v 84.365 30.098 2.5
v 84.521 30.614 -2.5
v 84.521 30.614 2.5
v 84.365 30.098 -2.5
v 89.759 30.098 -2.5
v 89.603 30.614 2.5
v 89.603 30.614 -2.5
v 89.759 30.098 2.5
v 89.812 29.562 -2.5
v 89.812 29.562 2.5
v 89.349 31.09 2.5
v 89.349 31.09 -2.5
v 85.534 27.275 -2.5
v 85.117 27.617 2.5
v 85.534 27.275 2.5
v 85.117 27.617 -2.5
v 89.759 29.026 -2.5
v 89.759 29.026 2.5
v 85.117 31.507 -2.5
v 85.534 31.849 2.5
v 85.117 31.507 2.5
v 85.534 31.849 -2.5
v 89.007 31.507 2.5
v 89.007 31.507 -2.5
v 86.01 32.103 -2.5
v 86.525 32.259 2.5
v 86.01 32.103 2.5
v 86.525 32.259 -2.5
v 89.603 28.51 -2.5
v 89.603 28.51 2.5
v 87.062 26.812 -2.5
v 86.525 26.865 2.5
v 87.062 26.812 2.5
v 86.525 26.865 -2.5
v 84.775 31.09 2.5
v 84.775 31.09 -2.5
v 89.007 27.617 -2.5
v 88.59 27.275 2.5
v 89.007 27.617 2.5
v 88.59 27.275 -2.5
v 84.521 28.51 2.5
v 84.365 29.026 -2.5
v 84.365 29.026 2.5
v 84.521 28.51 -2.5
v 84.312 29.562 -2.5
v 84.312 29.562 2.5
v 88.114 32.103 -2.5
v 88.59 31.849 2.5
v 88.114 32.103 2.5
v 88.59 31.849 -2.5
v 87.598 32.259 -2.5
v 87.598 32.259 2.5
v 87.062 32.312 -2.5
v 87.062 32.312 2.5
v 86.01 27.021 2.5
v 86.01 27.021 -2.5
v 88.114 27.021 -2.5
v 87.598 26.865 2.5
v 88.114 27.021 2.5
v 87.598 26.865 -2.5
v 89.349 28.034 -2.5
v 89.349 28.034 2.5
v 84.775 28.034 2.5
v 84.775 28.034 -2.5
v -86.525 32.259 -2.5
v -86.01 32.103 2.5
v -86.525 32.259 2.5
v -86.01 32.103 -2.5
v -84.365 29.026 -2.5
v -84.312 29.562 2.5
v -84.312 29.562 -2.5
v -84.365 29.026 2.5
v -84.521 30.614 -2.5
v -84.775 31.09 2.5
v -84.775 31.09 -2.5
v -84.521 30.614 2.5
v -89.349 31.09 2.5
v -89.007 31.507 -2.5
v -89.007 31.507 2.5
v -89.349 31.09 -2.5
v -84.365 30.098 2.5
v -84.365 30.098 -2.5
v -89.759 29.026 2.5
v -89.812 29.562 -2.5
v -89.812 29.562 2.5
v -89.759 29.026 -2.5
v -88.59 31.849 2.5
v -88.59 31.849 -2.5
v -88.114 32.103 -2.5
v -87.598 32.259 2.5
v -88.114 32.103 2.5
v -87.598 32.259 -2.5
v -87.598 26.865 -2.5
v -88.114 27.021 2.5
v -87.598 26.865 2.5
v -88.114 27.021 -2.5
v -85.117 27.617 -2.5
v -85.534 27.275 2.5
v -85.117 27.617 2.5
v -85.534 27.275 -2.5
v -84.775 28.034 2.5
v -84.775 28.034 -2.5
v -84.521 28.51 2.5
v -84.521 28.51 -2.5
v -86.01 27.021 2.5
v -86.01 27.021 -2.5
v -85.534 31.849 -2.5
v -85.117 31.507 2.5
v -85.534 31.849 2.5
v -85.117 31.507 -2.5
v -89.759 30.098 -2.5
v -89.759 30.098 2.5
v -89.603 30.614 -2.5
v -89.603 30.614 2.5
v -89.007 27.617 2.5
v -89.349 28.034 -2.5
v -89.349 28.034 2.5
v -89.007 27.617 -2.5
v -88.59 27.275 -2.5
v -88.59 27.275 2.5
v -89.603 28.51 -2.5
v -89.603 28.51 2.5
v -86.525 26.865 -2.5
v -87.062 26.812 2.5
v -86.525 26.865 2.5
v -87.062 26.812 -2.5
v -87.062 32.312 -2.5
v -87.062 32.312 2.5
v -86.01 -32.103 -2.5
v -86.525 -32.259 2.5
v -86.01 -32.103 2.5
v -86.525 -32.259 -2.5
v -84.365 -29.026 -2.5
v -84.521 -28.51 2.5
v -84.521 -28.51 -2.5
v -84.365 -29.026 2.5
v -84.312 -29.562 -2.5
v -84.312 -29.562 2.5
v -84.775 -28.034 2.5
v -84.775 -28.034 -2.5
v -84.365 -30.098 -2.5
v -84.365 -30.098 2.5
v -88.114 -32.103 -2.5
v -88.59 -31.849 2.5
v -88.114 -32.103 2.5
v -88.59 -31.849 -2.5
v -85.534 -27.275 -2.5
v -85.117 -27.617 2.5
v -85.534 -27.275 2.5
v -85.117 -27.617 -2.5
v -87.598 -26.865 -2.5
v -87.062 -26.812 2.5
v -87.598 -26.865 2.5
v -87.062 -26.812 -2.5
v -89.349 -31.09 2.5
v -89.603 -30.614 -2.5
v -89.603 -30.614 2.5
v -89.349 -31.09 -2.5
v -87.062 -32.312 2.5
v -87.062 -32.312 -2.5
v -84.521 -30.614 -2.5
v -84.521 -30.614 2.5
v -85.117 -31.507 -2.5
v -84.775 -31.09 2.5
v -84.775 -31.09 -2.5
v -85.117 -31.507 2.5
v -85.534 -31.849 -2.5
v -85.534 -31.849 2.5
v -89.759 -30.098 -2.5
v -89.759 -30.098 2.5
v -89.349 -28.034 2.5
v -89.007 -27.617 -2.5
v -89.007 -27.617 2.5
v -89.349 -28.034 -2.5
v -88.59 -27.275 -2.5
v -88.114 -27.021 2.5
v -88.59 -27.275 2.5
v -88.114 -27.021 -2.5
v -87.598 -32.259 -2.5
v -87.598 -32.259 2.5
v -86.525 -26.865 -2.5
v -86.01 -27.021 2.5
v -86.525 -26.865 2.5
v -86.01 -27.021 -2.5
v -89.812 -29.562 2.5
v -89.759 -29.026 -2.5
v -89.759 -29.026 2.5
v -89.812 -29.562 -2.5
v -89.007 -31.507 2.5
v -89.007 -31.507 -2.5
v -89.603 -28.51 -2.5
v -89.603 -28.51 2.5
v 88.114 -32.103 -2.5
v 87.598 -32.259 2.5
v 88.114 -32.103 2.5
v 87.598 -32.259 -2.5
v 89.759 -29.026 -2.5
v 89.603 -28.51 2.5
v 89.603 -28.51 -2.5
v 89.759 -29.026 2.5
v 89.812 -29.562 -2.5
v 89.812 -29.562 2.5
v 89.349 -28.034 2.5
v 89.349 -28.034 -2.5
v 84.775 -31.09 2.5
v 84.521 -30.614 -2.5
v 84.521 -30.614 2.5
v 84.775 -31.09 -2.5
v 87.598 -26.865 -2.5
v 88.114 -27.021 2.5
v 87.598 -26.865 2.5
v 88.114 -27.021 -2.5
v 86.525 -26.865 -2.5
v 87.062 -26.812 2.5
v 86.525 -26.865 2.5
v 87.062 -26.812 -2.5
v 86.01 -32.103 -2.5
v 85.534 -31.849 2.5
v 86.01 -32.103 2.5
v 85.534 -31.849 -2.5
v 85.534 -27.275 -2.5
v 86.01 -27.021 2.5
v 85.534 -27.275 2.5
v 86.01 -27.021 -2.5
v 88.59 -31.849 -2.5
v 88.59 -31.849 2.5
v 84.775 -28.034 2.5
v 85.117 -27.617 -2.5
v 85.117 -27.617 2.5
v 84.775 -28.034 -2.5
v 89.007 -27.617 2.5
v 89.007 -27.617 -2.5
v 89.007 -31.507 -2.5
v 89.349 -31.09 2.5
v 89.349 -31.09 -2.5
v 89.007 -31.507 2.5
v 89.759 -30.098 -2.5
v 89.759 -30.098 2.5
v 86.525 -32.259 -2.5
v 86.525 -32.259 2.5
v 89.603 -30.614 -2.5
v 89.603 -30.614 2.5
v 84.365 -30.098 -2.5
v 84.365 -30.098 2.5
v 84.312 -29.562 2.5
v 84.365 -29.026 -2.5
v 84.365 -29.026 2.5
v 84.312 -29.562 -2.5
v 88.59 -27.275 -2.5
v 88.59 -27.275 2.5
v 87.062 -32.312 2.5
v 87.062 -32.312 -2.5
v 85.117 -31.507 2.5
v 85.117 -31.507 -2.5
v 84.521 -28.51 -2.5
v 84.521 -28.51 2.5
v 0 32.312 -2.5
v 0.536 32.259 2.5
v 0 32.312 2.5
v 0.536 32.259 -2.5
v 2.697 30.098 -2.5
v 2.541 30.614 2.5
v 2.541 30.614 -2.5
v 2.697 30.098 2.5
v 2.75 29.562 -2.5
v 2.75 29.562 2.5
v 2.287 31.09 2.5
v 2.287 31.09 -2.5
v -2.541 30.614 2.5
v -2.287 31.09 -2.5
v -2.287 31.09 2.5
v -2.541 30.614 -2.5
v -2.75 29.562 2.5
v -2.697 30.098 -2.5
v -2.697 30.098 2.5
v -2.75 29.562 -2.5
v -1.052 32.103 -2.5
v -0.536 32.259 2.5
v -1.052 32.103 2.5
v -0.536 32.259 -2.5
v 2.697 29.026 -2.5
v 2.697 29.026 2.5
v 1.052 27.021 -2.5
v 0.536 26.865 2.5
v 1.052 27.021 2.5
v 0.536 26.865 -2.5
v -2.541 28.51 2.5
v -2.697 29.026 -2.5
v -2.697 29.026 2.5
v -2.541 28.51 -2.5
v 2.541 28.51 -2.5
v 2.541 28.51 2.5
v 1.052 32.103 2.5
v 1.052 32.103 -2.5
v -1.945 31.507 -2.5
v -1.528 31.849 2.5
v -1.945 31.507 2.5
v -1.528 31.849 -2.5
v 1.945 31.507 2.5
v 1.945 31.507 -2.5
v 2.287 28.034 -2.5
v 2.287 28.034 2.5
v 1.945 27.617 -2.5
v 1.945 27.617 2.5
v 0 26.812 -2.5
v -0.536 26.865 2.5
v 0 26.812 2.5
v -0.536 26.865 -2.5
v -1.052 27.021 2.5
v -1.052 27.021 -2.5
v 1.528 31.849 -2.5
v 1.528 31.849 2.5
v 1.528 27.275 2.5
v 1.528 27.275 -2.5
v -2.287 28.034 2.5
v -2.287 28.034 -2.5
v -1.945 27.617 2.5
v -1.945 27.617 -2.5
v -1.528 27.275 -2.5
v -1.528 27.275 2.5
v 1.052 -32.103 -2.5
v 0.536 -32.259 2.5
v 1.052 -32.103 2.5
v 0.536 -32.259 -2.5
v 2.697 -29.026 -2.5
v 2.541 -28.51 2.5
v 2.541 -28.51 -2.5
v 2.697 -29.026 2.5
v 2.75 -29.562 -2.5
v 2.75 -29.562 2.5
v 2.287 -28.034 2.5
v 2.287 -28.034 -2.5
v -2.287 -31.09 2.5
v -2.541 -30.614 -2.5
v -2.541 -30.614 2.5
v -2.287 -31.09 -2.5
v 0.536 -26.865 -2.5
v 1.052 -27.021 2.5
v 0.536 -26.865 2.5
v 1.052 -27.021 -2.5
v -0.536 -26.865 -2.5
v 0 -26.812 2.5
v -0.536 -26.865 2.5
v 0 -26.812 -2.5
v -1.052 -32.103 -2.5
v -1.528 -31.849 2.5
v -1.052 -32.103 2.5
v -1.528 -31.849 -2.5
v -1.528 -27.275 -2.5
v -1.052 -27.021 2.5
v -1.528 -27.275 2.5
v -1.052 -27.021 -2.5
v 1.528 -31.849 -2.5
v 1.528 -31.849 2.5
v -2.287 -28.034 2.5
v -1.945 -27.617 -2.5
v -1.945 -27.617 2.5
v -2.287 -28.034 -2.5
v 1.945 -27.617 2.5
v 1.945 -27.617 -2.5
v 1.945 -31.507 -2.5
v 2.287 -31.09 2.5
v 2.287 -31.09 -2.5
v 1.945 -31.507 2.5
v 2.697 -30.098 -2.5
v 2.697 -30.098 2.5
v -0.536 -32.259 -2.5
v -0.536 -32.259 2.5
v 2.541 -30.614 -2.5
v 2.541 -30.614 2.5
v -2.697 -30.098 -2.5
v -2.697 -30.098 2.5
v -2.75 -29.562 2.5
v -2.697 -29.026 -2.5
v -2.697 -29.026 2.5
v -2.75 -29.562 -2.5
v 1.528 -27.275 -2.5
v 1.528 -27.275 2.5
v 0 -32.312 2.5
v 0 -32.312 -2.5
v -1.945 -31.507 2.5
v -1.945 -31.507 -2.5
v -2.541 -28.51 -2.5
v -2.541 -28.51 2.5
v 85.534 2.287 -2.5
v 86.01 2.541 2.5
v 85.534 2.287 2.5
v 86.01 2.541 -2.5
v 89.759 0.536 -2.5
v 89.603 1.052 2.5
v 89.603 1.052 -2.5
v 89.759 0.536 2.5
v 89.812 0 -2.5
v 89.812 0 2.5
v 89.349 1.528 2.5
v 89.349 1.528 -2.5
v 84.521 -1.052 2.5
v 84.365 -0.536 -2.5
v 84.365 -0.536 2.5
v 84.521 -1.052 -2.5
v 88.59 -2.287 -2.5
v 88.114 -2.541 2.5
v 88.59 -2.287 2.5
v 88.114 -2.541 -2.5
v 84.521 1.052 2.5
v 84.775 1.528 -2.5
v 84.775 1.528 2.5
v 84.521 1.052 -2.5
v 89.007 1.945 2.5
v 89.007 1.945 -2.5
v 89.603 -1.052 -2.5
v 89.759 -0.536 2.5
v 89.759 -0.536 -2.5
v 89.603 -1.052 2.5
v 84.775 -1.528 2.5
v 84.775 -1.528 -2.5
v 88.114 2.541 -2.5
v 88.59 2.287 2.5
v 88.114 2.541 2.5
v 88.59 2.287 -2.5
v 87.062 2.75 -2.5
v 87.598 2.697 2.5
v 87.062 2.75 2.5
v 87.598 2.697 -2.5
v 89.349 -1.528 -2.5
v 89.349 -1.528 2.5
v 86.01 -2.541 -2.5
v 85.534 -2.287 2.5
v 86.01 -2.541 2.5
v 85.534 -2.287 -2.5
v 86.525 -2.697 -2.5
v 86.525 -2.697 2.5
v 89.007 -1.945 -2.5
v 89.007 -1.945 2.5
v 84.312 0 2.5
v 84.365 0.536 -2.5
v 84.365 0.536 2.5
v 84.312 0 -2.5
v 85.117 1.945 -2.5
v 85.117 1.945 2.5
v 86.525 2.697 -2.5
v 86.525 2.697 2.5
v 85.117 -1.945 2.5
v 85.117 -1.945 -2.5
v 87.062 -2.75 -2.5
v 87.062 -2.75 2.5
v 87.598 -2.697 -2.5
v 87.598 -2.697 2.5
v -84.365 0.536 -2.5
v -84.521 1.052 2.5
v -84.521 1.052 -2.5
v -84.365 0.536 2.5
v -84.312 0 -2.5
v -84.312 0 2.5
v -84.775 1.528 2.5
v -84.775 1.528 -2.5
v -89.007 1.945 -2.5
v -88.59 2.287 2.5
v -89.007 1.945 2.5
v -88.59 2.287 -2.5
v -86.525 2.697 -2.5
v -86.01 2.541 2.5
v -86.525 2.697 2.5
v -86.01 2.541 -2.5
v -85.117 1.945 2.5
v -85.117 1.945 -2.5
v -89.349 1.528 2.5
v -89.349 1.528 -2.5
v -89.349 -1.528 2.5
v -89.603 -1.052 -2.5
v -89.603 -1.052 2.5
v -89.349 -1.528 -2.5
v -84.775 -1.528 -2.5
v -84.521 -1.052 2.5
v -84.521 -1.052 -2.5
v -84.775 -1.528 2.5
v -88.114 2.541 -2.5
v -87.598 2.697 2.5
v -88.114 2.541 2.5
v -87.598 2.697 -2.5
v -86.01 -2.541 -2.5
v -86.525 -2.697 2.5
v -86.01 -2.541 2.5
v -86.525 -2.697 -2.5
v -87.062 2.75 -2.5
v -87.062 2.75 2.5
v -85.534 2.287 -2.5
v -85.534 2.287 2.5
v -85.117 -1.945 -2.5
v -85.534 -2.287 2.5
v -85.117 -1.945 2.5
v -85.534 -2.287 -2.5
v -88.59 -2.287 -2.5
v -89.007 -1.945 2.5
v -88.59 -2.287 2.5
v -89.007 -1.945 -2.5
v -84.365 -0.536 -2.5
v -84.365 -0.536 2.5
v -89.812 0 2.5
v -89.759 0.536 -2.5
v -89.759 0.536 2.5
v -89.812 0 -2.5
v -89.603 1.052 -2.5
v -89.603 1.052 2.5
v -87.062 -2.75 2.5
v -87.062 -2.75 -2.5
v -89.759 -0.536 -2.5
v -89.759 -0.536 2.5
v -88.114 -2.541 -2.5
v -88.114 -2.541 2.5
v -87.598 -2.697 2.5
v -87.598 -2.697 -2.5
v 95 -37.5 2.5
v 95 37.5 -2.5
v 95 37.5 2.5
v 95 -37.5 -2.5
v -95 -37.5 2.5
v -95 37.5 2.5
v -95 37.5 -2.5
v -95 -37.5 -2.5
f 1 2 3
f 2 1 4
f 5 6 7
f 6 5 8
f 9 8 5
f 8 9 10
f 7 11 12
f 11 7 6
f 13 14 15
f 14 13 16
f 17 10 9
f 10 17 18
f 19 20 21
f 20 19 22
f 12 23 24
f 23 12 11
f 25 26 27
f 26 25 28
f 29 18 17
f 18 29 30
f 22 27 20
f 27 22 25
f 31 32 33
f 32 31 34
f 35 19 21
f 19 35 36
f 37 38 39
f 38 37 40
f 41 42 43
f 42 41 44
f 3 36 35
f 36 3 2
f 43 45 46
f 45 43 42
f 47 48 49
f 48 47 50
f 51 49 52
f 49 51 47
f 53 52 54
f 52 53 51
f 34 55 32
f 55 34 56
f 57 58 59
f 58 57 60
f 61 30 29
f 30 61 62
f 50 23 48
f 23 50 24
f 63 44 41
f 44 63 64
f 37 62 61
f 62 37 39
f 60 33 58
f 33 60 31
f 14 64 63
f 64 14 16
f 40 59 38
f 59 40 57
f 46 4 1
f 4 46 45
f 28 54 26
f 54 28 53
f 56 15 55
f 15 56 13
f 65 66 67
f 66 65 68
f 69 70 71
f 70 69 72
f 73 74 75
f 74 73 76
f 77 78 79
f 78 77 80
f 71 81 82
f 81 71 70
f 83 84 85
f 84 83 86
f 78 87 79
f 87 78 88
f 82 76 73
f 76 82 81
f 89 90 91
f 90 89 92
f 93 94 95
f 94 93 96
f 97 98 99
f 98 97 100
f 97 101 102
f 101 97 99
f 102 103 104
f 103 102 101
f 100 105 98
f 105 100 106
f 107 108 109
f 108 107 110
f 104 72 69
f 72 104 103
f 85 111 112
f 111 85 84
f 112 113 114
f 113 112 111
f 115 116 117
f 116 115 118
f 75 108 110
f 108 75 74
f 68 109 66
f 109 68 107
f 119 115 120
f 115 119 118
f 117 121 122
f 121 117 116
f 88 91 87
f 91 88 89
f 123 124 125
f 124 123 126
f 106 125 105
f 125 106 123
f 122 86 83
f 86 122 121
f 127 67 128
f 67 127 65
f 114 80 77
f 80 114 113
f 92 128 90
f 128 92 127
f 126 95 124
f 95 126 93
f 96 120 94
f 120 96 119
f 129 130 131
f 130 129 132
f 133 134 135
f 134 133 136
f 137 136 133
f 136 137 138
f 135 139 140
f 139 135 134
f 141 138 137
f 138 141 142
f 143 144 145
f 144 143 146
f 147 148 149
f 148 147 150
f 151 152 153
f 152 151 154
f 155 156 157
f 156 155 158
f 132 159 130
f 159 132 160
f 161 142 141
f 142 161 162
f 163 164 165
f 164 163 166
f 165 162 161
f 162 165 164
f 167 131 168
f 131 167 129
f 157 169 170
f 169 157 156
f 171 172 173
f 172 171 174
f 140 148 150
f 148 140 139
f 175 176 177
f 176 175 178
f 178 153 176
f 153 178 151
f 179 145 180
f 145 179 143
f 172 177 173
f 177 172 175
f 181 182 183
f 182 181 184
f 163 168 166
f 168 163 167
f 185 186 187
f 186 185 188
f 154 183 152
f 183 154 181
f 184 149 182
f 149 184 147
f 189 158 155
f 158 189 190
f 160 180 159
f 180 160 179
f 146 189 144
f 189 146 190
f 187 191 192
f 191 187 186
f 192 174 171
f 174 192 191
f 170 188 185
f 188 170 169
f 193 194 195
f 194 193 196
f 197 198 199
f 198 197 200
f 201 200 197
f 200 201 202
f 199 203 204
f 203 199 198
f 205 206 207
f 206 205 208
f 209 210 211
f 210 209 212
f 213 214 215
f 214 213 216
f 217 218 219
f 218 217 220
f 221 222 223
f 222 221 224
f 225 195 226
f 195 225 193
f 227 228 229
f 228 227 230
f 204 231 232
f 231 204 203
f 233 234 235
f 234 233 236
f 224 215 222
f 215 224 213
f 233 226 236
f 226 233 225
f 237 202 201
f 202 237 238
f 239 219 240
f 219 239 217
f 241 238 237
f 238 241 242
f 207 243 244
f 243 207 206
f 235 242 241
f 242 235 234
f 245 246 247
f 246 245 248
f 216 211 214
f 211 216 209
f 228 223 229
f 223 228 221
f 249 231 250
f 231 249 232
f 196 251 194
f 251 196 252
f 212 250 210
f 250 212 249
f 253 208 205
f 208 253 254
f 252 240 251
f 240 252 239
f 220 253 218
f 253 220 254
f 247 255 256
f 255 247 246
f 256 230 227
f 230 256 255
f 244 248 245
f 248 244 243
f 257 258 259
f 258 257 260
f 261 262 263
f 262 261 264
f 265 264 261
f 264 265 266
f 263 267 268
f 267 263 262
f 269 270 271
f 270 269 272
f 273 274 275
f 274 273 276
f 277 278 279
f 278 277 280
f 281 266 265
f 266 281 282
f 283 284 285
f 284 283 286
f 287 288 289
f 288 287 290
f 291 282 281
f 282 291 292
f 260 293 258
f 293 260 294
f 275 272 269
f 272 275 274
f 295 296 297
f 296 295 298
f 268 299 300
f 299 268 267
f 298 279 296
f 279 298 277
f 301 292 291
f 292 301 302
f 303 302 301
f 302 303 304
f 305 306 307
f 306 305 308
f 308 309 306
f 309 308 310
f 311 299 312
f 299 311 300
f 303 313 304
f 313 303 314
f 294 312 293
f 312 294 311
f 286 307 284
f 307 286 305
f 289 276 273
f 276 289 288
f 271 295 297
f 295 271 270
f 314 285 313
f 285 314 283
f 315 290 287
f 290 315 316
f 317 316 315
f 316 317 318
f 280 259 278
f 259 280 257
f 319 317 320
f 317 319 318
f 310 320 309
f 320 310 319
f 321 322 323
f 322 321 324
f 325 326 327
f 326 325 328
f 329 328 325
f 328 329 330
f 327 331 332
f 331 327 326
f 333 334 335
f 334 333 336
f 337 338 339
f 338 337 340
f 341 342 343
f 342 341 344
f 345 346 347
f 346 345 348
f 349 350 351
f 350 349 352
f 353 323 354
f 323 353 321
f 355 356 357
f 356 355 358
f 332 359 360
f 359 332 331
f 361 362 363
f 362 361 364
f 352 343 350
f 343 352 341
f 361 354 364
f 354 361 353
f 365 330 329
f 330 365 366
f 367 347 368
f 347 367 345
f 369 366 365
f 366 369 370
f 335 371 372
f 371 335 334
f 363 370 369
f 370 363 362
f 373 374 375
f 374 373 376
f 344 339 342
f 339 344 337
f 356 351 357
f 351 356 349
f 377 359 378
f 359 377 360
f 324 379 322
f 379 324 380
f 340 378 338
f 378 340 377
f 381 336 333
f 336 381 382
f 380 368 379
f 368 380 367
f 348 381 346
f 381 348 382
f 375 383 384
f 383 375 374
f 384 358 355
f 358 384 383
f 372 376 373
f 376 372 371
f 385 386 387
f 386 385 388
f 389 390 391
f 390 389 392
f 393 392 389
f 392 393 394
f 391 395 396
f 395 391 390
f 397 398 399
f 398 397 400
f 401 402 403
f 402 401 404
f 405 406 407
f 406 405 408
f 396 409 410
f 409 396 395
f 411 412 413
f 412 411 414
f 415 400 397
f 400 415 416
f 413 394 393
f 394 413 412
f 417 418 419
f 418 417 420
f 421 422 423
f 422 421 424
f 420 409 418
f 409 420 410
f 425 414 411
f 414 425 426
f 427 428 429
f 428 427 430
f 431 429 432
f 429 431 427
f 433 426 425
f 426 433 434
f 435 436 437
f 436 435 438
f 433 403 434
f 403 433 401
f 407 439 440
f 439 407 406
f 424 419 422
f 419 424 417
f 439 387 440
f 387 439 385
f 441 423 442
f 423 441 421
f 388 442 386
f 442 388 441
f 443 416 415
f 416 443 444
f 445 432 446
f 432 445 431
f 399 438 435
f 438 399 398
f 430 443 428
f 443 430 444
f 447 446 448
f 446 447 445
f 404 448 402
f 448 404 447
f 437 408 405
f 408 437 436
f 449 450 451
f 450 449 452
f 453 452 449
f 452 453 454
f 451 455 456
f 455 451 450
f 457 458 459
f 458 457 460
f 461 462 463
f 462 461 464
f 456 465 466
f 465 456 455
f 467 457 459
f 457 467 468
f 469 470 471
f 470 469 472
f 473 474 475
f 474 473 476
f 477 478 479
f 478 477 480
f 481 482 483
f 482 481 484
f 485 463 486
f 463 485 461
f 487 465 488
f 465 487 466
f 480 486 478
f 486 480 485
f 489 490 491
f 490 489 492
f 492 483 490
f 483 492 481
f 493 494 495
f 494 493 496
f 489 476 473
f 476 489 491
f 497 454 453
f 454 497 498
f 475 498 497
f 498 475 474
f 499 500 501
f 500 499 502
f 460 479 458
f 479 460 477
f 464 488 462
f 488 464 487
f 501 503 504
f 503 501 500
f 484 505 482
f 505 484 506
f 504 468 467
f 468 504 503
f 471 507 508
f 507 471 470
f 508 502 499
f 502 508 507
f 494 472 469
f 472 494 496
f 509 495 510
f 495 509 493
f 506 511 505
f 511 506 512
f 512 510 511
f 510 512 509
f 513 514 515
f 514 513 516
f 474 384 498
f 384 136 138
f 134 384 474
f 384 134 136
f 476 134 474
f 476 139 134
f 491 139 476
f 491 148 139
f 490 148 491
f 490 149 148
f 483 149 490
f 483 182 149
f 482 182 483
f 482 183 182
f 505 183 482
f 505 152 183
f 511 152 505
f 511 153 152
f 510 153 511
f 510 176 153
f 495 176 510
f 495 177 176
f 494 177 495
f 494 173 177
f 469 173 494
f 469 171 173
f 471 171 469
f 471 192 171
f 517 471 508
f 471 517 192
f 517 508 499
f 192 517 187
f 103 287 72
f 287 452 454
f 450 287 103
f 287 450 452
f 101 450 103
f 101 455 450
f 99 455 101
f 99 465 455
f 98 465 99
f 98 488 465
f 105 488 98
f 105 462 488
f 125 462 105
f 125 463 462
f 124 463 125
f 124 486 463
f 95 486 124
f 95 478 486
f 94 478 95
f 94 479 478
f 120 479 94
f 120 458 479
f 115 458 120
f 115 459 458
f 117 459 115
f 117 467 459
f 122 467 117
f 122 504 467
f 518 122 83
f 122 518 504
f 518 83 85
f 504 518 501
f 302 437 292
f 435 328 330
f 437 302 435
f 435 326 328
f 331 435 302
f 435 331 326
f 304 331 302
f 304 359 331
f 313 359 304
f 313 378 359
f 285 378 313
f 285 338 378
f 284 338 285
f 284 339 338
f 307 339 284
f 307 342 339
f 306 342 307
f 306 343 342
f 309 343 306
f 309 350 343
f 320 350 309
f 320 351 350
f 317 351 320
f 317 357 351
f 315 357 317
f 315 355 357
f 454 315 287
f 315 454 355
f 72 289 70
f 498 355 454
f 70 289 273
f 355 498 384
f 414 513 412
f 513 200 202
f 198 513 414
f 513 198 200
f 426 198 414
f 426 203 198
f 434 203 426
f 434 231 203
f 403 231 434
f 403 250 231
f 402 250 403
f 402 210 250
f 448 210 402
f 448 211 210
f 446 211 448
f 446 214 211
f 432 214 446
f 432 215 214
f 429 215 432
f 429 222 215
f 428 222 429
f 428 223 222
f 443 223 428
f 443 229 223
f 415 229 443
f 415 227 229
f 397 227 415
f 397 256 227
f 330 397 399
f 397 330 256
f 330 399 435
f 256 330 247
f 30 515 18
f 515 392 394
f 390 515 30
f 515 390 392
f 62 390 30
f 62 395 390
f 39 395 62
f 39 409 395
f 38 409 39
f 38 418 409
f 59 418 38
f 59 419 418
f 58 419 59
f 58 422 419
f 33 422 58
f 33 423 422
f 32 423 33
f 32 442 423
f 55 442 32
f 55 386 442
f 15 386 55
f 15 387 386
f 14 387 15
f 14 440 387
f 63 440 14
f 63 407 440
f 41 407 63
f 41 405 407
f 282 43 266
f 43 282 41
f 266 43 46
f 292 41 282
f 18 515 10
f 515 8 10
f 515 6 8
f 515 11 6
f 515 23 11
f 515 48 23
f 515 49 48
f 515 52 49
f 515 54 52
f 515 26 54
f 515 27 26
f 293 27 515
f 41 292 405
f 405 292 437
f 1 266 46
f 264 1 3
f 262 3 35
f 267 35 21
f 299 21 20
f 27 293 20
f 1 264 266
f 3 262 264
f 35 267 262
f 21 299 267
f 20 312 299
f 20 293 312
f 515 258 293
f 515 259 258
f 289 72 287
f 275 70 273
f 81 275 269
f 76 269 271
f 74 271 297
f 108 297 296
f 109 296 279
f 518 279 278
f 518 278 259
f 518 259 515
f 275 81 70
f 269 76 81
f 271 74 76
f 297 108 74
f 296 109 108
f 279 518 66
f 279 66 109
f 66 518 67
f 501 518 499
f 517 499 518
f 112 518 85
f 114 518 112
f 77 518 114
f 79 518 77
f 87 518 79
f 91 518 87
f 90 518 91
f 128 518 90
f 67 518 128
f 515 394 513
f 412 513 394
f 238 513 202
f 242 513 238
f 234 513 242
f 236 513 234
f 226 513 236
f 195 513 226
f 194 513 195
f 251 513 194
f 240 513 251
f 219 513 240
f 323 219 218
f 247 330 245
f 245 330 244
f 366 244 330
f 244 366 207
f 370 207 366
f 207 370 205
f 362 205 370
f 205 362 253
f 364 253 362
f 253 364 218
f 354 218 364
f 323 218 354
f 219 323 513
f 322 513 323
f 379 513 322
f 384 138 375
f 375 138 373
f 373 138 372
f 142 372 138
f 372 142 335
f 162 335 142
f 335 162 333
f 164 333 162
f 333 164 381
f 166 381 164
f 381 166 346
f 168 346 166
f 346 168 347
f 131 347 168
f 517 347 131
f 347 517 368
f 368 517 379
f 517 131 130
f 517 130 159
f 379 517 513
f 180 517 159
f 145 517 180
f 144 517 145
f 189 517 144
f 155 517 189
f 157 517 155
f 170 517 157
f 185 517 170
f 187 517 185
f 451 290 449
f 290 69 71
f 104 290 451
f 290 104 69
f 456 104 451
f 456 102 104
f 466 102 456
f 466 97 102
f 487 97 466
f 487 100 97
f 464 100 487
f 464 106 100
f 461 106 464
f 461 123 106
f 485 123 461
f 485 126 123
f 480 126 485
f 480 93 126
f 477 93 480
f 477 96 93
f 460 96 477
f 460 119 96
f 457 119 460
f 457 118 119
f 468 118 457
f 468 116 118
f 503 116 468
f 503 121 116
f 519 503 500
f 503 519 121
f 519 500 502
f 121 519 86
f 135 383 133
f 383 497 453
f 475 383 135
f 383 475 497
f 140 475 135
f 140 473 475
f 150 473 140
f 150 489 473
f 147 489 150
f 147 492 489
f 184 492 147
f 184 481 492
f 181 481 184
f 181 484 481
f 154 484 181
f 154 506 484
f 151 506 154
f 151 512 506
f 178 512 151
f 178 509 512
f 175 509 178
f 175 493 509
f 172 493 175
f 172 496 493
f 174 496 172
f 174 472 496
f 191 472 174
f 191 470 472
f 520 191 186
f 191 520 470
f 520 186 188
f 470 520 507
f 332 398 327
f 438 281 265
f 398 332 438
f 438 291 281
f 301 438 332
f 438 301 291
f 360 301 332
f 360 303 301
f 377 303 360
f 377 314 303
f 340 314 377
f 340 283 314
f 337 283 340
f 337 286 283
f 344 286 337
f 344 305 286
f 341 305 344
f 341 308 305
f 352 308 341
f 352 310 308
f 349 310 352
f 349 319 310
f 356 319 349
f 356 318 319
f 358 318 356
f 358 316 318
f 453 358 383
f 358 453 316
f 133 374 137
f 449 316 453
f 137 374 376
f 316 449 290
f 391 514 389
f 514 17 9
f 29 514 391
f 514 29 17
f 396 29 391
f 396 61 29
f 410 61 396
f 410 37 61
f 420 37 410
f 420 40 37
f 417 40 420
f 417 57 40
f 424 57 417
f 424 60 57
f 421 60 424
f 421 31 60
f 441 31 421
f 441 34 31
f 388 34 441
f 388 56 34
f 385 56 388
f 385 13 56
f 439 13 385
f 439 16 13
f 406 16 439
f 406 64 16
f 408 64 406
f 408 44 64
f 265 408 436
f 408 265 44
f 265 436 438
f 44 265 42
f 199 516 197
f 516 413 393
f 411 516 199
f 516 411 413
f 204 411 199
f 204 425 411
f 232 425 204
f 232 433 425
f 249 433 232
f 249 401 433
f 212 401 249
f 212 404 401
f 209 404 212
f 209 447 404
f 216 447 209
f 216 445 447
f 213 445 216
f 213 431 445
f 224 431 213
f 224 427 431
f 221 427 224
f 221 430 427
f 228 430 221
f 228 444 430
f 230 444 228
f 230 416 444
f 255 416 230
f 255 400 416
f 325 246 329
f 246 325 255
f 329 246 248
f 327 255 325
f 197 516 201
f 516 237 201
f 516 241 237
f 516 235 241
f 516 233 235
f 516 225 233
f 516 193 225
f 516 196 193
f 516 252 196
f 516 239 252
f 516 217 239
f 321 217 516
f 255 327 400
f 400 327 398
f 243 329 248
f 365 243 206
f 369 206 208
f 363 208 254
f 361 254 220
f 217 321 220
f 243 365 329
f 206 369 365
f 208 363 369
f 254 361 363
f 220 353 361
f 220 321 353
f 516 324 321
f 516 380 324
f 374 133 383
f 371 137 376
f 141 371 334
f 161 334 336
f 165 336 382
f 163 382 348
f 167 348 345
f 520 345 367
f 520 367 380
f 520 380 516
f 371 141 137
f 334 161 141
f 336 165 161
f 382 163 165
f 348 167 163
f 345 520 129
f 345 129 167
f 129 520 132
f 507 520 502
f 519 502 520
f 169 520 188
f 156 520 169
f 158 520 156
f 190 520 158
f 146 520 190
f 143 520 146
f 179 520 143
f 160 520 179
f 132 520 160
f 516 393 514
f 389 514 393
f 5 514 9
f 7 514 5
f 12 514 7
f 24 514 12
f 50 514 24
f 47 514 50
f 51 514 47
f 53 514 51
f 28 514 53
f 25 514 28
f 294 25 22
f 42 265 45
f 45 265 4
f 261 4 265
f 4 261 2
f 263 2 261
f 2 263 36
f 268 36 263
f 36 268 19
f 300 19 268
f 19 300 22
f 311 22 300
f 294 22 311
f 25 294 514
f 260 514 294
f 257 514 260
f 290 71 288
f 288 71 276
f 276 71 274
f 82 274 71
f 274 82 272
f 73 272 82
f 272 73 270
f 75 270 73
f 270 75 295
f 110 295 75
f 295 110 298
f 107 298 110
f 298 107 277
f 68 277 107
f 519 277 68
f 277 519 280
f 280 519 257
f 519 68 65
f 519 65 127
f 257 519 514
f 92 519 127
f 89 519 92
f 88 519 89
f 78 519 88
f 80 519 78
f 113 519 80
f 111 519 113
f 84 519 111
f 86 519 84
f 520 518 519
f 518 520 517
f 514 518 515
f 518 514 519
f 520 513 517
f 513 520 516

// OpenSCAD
$fn = 32;

// ----------------------------------------------------------------------
// Corner plate 190 x 75 x 5
// 8 holes, centres taken from the edge offset
// ----------------------------------------------------------------------

// --- parameters (mm) ---
plate = [190, 75, 5];  // overall size (x, y, z)
holes = 8;             // number of holes the drawing asks for
hole_d = 5.5;          // hole diameter
edge = 7.938;          // hole centre offset from the plate edge

// --- derived feature positions (mm) ---
corner_x = plate[0] / 2 - edge;  // = 87.06   corner hole X
corner_y = plate[1] / 2 - edge;  // = 29.56   corner hole Y
feature_centers = [
  [corner_x, corner_y],
  [-corner_x, corner_y],
  [-corner_x, -corner_y],
  [corner_x, -corner_y],
  [0, corner_y],
  [0, -corner_y],
  [corner_x, 0],
  [-corner_x, 0]
];   // hole centres the loop below drills

// plate outline, every hole drilled through with the same cutters
difference() {
  cube(plate, center = true);
  for (centre = feature_centers)
    translate([centre[0], centre[1], 0])
      cylinder(d = hole_d, h = plate[2] + 2, center = true);
}
